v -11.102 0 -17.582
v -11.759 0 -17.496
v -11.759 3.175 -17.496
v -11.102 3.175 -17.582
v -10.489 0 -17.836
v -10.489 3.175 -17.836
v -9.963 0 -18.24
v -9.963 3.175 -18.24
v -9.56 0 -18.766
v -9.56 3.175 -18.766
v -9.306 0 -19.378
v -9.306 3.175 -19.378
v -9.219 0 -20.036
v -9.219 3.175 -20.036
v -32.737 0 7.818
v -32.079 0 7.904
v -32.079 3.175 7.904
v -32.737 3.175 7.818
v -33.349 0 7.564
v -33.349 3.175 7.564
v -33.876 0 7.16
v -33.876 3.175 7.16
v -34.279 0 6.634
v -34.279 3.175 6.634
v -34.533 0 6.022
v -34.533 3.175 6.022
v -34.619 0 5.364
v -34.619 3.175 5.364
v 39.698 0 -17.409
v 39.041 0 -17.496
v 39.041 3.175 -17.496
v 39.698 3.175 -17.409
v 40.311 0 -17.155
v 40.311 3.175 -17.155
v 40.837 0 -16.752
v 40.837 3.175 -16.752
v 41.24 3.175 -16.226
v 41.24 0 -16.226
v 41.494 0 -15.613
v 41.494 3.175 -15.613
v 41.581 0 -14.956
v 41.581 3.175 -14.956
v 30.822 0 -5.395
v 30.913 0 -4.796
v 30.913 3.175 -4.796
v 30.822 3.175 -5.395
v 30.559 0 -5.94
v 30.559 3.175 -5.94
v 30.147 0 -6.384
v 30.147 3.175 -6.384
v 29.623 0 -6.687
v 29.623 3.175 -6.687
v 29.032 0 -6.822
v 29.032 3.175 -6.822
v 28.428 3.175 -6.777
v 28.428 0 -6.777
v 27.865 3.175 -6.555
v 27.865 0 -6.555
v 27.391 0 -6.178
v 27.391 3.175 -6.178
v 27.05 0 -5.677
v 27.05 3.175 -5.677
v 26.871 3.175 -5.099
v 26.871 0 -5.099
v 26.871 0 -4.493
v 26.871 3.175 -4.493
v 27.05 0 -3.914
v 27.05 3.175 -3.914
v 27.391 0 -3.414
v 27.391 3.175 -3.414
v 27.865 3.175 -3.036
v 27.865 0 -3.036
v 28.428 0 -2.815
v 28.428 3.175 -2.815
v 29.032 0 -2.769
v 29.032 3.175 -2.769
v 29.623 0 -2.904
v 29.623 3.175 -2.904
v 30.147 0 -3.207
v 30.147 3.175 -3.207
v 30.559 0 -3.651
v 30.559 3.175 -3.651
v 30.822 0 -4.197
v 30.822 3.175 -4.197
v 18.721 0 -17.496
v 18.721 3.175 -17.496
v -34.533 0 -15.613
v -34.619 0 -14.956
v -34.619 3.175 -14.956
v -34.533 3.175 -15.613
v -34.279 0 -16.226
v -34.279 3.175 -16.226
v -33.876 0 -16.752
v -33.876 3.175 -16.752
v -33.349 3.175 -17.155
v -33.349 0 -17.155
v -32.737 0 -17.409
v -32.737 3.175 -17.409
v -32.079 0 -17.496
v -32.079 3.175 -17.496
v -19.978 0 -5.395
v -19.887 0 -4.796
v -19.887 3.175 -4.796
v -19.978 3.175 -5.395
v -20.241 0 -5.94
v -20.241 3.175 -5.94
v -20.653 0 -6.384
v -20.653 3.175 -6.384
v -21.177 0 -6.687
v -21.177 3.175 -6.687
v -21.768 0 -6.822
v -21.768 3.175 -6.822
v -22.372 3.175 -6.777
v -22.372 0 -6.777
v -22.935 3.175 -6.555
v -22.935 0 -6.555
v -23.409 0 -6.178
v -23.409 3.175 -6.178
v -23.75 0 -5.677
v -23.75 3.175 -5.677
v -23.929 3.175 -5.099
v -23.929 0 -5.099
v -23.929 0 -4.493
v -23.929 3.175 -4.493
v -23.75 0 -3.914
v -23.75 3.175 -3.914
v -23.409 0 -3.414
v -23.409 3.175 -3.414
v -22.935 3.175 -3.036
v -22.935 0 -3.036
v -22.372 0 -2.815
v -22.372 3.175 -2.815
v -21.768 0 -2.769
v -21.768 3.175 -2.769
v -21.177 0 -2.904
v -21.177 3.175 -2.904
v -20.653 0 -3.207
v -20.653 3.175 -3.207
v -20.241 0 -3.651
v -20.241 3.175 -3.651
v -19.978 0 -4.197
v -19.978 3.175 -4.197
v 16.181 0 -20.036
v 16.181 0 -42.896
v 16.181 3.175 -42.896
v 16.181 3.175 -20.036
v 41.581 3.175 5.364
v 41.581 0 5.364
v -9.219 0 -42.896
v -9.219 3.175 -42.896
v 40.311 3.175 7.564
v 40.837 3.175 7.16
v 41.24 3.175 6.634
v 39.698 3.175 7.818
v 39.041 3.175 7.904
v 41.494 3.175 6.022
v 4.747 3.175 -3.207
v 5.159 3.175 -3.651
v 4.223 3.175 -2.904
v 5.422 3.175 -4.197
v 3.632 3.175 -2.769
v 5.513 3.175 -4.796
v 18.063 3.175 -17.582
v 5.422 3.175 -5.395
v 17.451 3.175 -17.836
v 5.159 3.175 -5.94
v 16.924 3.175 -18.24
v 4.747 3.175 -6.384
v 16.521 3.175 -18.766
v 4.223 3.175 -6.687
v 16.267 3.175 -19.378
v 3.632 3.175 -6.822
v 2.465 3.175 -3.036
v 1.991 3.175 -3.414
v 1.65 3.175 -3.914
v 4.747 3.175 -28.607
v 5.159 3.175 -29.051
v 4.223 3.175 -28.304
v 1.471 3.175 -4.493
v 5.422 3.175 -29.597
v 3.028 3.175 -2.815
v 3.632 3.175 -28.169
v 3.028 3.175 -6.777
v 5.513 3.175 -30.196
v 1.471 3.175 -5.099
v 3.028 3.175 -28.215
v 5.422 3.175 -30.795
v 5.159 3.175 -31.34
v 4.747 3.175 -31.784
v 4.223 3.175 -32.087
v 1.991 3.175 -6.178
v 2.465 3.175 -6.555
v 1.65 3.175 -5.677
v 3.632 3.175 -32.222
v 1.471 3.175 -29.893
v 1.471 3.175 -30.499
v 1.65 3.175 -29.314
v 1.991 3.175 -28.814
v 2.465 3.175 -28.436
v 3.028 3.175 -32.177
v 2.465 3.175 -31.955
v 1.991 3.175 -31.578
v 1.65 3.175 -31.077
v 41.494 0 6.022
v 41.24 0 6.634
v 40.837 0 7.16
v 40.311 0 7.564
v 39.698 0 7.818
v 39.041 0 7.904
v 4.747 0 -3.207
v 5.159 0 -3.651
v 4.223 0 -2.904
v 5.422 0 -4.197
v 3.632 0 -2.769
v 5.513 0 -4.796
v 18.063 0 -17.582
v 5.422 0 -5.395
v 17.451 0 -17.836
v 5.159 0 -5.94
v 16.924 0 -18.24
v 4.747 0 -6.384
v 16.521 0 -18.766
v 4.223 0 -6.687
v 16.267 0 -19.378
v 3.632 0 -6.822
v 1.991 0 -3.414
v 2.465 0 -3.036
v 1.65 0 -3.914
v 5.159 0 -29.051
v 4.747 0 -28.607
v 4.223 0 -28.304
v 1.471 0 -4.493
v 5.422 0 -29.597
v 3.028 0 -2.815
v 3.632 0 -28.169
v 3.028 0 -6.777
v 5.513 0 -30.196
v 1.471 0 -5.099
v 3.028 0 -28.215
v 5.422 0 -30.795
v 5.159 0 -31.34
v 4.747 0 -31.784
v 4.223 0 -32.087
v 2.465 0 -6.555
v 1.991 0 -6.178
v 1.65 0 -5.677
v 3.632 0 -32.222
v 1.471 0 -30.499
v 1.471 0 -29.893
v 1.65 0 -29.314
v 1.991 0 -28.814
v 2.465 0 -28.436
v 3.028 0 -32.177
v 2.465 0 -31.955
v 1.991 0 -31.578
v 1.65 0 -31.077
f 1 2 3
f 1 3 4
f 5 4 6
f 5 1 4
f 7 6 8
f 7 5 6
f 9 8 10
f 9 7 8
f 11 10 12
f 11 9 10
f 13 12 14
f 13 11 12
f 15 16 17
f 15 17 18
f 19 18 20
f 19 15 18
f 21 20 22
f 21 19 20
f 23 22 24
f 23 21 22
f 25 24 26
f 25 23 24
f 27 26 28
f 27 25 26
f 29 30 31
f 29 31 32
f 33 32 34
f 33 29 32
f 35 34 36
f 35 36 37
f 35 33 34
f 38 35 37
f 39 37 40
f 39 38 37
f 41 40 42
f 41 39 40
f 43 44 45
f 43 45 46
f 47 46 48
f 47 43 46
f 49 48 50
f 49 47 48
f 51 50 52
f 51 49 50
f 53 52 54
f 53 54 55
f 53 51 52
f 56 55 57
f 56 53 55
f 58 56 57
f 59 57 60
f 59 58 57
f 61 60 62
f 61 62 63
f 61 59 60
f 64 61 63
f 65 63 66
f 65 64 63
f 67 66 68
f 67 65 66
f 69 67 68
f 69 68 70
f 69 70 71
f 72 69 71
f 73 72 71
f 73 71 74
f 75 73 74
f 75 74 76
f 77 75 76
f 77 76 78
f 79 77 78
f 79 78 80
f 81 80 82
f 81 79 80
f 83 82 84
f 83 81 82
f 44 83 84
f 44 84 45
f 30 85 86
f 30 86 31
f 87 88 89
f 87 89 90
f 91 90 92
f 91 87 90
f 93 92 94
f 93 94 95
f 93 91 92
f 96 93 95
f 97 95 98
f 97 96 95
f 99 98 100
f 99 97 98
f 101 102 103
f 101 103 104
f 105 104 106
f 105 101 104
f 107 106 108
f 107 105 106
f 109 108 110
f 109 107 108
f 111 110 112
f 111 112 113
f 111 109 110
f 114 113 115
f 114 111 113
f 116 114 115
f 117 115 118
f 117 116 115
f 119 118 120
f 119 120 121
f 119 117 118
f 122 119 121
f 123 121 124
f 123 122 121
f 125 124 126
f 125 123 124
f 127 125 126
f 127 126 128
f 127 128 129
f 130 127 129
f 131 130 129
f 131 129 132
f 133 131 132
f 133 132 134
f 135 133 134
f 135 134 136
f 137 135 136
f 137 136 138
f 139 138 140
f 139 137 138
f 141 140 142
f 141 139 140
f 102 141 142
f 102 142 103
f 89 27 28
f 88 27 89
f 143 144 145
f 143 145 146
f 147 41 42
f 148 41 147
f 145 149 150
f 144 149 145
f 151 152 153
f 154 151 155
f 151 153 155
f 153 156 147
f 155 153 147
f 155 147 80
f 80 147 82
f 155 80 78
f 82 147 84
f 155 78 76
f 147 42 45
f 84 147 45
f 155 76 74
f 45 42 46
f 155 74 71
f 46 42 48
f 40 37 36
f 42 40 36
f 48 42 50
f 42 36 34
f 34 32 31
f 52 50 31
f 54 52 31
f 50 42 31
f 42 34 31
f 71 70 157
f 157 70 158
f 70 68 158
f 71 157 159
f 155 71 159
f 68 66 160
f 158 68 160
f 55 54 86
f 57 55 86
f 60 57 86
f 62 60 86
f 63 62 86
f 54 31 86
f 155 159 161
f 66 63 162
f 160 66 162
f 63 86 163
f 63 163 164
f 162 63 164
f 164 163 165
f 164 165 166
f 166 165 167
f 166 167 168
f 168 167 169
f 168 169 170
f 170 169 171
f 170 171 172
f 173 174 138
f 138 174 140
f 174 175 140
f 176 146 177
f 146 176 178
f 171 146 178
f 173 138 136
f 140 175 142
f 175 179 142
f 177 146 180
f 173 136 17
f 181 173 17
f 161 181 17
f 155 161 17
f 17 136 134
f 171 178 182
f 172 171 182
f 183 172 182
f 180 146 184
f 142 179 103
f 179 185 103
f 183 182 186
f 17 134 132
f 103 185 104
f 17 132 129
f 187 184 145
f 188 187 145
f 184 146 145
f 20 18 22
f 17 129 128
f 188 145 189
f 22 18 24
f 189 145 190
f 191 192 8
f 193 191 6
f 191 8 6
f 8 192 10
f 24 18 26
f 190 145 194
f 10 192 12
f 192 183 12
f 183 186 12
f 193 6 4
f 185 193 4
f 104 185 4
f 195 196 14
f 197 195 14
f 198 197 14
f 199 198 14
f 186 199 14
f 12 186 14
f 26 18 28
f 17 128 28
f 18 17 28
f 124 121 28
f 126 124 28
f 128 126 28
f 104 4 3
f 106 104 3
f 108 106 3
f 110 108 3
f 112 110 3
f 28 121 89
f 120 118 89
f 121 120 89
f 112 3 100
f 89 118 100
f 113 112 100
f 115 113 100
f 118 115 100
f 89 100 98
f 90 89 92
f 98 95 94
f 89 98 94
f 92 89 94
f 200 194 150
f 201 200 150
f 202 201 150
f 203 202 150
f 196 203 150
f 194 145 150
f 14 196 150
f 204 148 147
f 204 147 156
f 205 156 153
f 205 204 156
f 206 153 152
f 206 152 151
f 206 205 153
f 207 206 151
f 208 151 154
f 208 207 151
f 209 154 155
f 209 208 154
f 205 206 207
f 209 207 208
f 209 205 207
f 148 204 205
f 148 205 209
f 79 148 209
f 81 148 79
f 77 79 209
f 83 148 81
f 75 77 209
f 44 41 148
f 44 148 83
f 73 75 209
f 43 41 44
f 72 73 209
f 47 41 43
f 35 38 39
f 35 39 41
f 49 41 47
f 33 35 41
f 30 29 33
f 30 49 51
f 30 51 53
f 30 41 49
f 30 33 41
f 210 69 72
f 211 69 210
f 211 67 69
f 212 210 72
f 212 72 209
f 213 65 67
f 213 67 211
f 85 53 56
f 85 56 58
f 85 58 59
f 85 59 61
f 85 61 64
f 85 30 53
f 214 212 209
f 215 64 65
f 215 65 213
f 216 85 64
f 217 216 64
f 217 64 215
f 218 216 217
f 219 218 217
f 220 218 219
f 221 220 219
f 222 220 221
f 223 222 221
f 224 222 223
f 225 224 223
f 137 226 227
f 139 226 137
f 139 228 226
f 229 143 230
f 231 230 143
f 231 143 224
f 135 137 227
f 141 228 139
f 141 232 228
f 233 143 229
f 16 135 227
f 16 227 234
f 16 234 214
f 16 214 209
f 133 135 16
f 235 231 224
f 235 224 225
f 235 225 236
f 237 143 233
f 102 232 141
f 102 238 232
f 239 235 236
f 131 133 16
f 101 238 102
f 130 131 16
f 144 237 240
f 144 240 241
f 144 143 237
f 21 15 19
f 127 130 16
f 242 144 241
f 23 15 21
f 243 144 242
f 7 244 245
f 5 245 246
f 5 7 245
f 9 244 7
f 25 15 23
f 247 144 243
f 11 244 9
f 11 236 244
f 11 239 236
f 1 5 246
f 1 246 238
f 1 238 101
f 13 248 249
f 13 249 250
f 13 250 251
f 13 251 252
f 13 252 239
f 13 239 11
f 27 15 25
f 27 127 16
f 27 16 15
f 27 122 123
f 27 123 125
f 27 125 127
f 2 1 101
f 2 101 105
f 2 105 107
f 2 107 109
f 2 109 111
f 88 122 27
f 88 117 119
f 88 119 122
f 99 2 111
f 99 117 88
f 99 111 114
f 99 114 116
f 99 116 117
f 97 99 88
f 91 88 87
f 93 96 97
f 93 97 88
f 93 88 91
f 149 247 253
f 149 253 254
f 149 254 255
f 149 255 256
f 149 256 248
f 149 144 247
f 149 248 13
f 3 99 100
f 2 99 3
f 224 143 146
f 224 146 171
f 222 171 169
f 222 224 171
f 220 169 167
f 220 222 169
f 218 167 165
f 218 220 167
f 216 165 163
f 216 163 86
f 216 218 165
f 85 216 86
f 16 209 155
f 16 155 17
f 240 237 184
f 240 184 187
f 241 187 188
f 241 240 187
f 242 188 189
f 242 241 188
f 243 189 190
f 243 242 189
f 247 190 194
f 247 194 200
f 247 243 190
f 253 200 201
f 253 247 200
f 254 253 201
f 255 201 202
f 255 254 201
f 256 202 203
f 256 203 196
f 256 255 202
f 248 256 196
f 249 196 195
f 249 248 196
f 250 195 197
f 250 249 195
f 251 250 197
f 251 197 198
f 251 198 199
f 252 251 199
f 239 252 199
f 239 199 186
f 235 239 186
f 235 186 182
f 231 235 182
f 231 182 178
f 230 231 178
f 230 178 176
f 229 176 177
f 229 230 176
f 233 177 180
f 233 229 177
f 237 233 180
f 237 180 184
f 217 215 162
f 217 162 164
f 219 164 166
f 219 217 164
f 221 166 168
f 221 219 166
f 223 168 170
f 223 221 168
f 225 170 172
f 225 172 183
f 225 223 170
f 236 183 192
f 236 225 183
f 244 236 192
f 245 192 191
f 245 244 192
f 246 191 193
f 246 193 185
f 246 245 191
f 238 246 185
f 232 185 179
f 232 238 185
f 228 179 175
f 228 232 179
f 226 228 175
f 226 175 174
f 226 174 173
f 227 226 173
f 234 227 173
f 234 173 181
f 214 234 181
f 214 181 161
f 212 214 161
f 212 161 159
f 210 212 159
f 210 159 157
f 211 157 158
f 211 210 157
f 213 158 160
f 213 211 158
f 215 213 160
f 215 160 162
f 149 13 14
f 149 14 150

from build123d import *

# Parameters (mm, degrees)
SKETCH1_R           = 2.032
BOSS_EXTRUDE1_DEPTH = 3.175


with BuildPart() as part:
    # Sketch1 → Boss-Extrude1 (new body)
    with BuildSketch(Plane(origin=(0, 0, 0), x_dir=(1, 0, 0), z_dir=(0, 1, 0))):
        with BuildLine():
            Line((18.720543933, 17.495711297), (39.040543933, 17.495711297))
            ThreePointArc((39.040543933, 17.495711297), (40.836595157, 16.751762521), (41.580543933, 14.955711297))
            Line((41.580543933, 14.955711297), (41.580543933, -5.364288703))
            ThreePointArc((41.580543933, -5.364288703), (40.836595157, -7.160339927), (39.040543933, -7.904288703))
            Line((39.040543933, -7.904288703), (-32.079456067, -7.904288703))
            ThreePointArc((-32.079456067, -7.904288703), (-33.875507291, -7.160339927), (-34.619456067, -5.364288703))
            Line((-34.619456067, -5.364288703), (-34.619456067, 14.955711297))
            ThreePointArc((-34.619456067, 14.955711297), (-33.875507291, 16.751762521), (-32.079456067, 17.495711297))
            Line((-32.079456067, 17.495711297), (-11.759456067, 17.495711297))
            ThreePointArc((-11.759456067, 17.495711297), (-9.963404843, 18.239660073), (-9.219456067, 20.035711297))
            Line((-9.219456067, 20.035711297), (-9.219456067, 42.895711297))
            Line((-9.219456067, 42.895711297), (16.180543933, 42.895711297))
            Line((16.180543933, 42.895711297), (16.180543933, 20.035711297))
            ThreePointArc((16.180543933, 20.035711297), (16.924492709, 18.239660073), (18.720543933, 17.495711297))
        make_face()
        with Locations((3.480543933, 4.795711297)):
            Circle(SKETCH1_R, mode=Mode.SUBTRACT)
        with Locations((-21.919456067, 4.795711297)):
            Circle(SKETCH1_R, mode=Mode.SUBTRACT)
        with Locations((28.880543933, 4.795711297)):
            Circle(SKETCH1_R, mode=Mode.SUBTRACT)
        with Locations((3.480543933, 30.195711297)):
            Circle(SKETCH1_R, mode=Mode.SUBTRACT)
    extrude(amount=BOSS_EXTRUDE1_DEPTH)


solid = part.part
